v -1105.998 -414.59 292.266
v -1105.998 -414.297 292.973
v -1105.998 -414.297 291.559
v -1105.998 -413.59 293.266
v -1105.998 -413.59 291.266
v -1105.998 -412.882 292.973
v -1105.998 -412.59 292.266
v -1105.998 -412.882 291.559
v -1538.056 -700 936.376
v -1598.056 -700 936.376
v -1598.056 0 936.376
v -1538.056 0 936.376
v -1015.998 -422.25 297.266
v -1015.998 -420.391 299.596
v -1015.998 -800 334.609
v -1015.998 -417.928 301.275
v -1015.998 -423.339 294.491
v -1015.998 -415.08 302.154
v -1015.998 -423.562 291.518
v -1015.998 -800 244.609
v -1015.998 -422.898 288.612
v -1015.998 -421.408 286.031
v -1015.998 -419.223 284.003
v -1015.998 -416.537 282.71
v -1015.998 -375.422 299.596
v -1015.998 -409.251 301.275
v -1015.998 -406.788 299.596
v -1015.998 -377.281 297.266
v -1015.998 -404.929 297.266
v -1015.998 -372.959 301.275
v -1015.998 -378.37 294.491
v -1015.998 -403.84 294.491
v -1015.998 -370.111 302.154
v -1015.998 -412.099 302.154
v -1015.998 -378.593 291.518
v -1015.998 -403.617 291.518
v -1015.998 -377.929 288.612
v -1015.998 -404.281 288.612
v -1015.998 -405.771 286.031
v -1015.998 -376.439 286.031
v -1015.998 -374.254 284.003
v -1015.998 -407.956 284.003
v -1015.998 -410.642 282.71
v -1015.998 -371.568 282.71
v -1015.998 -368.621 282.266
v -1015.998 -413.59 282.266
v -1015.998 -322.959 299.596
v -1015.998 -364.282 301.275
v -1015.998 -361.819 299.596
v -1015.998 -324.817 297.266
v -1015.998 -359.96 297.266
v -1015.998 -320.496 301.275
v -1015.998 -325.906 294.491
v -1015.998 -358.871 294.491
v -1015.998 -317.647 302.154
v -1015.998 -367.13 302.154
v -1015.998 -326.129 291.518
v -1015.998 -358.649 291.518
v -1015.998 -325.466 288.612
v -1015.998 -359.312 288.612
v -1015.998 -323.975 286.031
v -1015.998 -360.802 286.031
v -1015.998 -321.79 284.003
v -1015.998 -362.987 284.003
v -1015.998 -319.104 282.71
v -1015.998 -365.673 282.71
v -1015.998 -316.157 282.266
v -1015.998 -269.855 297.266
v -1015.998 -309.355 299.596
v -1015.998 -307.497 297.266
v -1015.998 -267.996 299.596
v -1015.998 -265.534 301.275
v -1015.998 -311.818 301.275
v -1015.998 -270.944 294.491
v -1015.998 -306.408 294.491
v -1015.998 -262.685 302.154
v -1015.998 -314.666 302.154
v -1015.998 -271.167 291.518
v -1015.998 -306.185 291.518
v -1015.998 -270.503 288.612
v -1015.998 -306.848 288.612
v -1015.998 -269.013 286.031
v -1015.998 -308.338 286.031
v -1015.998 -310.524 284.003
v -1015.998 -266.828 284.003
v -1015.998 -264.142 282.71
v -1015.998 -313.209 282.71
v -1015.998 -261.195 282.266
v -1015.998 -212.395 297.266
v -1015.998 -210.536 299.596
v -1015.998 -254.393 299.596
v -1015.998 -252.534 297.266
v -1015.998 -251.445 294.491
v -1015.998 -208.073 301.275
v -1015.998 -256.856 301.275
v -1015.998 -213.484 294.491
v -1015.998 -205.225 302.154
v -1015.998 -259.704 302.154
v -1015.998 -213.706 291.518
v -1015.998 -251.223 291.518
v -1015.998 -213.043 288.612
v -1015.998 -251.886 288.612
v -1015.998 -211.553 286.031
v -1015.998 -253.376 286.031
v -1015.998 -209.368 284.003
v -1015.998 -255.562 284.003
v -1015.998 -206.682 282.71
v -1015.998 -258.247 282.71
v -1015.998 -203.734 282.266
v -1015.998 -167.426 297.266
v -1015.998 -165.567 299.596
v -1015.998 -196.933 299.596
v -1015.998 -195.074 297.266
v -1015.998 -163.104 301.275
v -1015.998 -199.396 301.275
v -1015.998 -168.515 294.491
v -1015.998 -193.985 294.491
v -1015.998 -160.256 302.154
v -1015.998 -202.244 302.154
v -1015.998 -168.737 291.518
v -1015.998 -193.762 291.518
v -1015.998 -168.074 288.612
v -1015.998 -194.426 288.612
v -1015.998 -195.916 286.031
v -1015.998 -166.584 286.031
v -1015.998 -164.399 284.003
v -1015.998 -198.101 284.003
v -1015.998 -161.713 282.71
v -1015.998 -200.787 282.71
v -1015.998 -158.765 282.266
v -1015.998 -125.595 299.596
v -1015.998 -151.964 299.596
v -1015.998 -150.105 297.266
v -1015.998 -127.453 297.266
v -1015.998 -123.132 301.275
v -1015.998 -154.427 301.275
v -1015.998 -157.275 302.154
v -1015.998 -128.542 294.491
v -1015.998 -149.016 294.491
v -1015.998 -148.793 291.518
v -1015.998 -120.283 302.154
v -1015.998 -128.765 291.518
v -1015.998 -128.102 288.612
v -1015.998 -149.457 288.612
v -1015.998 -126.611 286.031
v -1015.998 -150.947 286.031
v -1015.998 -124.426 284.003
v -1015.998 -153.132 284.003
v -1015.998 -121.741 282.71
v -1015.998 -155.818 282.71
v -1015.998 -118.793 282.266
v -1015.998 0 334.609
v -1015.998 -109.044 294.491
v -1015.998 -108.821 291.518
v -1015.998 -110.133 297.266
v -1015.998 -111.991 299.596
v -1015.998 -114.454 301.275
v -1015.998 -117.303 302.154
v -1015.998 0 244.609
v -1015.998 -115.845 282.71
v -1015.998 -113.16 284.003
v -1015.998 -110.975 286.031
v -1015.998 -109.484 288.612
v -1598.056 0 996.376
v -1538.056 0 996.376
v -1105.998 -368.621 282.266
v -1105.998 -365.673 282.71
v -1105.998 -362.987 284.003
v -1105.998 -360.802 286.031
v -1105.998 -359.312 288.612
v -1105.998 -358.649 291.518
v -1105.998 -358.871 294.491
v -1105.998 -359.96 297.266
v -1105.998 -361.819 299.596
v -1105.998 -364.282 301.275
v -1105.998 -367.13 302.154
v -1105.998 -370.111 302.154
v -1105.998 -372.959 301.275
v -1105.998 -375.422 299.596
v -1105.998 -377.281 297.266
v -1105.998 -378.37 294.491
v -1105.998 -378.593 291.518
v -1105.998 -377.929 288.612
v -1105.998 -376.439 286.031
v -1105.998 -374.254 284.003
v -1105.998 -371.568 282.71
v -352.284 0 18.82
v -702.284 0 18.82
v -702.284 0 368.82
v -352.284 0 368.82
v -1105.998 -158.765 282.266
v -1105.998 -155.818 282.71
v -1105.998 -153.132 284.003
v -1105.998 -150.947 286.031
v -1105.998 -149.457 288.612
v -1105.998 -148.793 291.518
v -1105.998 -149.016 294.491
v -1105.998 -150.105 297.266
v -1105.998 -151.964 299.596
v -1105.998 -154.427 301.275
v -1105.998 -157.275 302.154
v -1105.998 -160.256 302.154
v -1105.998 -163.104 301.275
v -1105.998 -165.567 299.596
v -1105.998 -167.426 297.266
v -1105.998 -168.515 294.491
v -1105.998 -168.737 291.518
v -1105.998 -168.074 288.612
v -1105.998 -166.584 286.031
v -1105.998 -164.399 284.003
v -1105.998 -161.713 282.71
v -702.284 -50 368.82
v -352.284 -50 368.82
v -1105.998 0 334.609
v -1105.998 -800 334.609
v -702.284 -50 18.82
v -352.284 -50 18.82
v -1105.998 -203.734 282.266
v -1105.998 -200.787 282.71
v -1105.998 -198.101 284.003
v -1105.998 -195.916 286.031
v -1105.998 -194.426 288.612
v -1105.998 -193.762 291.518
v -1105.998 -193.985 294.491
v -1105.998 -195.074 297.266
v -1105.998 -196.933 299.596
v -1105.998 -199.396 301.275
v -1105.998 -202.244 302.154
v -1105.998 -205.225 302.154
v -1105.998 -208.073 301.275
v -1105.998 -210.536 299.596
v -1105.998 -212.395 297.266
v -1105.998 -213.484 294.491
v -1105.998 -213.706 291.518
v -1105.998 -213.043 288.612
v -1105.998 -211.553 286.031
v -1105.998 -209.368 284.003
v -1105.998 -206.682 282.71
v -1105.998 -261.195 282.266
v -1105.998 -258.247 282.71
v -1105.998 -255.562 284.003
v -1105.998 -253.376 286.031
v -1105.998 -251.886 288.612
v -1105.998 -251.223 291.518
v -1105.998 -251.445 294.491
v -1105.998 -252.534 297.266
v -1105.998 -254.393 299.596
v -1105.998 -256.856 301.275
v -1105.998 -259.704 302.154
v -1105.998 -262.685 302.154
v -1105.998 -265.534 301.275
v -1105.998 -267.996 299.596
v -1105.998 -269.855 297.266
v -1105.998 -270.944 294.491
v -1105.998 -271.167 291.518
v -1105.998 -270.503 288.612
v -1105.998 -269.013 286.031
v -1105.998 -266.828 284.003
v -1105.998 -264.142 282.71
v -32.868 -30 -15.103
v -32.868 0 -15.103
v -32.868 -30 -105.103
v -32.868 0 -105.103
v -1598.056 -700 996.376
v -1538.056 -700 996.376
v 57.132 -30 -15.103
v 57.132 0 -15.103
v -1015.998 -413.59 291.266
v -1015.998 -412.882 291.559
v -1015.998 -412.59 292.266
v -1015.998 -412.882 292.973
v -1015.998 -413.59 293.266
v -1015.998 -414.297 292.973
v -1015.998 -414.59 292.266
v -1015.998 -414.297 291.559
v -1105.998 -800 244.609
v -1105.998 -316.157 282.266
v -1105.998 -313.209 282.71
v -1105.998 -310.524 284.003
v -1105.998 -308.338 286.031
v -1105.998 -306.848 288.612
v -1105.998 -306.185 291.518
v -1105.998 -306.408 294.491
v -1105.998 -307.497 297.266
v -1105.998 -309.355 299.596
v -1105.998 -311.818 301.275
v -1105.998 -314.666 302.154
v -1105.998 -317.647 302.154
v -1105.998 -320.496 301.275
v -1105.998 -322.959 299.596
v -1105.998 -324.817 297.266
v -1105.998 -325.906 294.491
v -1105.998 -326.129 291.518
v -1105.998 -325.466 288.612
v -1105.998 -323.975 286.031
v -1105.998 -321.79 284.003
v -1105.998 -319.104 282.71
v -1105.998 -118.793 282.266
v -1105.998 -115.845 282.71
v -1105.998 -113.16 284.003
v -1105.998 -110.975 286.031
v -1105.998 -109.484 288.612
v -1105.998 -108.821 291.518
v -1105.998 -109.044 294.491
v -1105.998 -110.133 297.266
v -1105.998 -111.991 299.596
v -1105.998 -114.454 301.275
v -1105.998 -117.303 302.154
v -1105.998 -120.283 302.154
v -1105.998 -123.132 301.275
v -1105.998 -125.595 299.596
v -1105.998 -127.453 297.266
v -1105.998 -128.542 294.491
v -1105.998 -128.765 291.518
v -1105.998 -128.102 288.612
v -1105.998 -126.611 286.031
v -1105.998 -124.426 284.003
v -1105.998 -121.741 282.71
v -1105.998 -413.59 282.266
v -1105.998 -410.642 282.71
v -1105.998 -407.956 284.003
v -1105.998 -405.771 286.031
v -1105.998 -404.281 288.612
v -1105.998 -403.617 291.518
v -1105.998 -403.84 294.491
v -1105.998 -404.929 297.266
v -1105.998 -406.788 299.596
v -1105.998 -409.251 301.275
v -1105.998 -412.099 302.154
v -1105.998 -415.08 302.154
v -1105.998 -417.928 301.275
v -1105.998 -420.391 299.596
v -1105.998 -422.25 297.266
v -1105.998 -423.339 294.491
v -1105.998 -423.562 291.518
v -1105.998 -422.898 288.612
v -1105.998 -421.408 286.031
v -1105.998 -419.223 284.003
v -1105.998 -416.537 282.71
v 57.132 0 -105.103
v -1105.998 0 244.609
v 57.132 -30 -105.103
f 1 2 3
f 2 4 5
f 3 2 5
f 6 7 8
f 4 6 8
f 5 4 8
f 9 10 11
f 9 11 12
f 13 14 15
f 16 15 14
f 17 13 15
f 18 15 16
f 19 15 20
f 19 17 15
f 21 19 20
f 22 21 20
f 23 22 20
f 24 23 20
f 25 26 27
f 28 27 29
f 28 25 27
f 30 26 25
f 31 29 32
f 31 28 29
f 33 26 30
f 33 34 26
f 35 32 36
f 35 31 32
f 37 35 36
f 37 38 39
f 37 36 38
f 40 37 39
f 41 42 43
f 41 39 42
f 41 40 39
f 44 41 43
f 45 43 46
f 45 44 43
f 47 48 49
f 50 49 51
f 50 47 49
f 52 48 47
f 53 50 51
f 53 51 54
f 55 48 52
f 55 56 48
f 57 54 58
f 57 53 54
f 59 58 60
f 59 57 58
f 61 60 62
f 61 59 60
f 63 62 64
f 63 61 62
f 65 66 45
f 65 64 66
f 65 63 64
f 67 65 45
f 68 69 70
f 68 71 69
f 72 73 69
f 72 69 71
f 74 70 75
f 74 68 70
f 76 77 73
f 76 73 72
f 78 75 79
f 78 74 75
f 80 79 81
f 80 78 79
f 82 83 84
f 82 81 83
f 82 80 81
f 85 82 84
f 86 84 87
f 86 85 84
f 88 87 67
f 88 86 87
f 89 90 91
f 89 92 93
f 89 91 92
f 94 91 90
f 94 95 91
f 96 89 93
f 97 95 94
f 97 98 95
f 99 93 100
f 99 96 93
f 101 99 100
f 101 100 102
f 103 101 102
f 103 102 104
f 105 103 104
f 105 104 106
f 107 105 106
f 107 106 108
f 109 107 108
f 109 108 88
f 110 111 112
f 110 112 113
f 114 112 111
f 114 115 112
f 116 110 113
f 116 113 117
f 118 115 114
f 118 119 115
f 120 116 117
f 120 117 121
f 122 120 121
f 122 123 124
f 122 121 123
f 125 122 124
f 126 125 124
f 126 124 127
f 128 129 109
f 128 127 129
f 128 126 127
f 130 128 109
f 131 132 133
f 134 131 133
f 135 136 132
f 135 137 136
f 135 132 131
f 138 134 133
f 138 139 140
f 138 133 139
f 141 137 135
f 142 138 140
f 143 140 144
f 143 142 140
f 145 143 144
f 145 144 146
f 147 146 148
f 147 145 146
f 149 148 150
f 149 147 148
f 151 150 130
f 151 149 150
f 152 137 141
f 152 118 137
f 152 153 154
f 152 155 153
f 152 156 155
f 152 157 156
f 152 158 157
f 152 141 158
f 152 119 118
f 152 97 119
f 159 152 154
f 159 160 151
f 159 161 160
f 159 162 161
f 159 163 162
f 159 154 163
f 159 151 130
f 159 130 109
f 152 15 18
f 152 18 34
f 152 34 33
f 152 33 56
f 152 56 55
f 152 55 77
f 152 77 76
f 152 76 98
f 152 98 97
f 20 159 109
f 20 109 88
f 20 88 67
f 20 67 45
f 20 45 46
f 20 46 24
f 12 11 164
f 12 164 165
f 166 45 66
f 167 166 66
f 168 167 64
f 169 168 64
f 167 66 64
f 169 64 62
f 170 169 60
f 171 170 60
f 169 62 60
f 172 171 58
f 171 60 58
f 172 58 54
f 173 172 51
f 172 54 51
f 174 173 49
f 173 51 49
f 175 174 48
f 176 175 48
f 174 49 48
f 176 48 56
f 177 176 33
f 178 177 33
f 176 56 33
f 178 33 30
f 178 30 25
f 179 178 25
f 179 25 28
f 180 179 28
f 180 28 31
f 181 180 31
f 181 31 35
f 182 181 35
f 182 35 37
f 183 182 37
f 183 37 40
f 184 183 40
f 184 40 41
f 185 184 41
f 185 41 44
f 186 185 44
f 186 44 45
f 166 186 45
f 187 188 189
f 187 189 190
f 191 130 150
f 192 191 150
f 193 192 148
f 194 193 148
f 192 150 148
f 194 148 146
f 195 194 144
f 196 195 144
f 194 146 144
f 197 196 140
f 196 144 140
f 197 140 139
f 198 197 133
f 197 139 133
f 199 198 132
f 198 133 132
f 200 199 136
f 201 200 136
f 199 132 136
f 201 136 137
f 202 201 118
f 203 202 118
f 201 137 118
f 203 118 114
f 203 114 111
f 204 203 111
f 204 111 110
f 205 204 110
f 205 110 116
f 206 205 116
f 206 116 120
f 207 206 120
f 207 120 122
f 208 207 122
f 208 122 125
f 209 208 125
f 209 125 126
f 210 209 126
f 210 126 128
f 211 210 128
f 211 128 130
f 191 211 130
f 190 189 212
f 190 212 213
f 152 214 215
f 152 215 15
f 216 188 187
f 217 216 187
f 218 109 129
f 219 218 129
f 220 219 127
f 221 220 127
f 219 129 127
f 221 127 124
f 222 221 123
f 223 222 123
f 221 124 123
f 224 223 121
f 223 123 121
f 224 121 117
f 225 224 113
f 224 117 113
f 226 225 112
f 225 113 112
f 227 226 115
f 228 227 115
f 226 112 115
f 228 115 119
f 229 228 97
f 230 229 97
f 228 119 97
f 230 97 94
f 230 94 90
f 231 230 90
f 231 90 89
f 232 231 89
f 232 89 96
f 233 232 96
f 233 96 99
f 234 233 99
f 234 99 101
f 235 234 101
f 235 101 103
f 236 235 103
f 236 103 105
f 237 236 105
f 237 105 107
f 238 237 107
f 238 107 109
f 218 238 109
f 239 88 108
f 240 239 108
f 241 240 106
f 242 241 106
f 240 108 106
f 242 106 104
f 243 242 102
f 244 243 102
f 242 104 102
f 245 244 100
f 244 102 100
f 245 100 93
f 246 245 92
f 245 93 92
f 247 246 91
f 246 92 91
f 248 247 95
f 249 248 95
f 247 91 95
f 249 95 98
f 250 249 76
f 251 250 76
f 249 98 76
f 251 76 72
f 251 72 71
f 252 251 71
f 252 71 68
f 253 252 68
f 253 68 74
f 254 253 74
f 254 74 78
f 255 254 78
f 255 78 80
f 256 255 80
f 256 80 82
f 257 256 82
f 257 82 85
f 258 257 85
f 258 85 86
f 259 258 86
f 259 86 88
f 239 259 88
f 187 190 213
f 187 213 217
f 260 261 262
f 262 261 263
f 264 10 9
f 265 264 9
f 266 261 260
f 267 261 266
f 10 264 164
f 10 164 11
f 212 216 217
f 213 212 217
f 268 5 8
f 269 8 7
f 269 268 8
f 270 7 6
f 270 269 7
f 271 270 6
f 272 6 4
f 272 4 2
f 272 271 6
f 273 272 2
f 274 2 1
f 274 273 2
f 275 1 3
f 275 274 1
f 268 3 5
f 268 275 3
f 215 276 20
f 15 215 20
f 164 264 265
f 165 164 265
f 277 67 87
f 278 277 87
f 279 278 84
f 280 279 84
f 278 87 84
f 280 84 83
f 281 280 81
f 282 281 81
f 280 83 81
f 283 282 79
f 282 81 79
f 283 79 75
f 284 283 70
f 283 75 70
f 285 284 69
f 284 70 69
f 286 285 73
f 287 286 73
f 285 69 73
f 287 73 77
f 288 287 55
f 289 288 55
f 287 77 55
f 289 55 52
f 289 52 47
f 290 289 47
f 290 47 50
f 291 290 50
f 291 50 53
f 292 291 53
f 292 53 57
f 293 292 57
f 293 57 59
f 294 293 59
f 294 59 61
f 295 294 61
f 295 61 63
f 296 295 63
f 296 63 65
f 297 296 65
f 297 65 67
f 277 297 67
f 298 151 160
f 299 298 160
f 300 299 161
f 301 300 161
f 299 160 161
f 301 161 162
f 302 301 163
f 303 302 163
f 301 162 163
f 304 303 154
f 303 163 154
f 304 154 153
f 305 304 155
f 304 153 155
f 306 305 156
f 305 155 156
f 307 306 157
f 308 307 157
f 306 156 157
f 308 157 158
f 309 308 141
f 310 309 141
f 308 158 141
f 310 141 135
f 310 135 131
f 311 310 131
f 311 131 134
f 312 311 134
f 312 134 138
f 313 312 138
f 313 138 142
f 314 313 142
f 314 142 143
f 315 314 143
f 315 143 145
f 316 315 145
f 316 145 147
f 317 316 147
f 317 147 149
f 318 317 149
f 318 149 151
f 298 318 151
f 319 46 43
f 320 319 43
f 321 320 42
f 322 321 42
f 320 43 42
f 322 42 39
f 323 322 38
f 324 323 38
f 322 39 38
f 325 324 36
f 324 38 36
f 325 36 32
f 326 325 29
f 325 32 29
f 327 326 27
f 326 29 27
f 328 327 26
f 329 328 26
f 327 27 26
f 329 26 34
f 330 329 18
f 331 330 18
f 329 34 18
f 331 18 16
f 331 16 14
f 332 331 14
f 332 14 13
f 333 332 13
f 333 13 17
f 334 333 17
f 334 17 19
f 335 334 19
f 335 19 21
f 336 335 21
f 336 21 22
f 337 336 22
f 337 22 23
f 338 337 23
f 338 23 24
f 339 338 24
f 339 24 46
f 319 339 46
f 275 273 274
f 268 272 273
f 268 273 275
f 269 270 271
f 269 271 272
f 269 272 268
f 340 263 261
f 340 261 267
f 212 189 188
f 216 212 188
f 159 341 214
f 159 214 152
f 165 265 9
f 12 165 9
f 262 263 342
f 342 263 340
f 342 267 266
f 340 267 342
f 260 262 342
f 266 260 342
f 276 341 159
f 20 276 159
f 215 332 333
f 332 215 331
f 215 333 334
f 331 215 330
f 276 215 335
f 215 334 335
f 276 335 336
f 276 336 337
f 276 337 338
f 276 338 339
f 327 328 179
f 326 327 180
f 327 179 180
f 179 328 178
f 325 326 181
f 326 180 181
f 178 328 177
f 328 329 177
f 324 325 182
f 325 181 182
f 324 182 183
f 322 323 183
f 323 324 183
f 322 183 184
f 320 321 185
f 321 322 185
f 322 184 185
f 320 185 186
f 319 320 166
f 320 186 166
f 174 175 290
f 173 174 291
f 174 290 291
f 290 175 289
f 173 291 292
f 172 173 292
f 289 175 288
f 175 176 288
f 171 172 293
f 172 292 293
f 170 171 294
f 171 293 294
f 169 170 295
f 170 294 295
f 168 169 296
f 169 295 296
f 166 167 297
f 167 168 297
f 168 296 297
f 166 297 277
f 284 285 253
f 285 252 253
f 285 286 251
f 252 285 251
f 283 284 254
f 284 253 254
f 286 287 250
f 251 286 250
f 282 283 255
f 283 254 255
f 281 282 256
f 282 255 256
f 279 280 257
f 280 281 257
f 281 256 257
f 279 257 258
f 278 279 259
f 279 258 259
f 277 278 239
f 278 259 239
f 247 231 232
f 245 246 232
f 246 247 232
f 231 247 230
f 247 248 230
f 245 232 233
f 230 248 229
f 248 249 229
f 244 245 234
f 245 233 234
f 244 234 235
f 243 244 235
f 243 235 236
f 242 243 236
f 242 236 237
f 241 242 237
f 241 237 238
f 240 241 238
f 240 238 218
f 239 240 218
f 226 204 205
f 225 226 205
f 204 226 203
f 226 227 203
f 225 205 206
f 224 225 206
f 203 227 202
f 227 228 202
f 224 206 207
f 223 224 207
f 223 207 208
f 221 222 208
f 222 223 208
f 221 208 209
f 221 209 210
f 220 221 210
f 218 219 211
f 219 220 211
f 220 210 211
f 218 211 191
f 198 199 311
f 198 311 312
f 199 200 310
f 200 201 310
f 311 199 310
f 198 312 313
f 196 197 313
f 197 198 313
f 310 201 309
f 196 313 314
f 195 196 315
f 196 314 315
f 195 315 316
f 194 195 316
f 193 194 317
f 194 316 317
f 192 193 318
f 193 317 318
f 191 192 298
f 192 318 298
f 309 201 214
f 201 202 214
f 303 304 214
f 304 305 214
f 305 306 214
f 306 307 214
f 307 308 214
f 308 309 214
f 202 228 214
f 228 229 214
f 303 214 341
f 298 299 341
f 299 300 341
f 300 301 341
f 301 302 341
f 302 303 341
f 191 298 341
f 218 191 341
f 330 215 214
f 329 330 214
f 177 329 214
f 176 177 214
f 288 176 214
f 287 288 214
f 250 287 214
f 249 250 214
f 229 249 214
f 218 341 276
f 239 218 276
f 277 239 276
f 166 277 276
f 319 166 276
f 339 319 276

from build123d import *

# Parameters (mm, degrees)
SKETCH1_W           = 90
SKETCH1_H           = 90
BOSS_EXTRUDE2_DEPTH = 30
SKETCH2_W           = 350
SKETCH2_H           = 350
BOSS_EXTRUDE3_DEPTH = 50
SKETCH3_W           = 90
SKETCH3_H           = 90
BOSS_EXTRUDE4_DEPTH = 800
SKETCH5_W           = 60
SKETCH5_H           = 60
BOSS_EXTRUDE5_DEPTH = 700
SKETCH4_R           = 10
SKETCH4_R_2         = 1
CUT_EXTRUDE2_DEPTH  = 583.058021663


with BuildPart() as part:
    # Sketch1 → Boss-Extrude2 (new body)
    with BuildSketch(Plane(origin=(0, 0, 0), x_dir=(1, 0, 0), z_dir=(0, 1, 0))):
        with Locations((12.132228886, 60.103304997)):
            Rectangle(SKETCH1_W, SKETCH1_H)
    extrude(amount=-BOSS_EXTRUDE2_DEPTH)


with BuildPart() as body_2:
    # Sketch2 → Boss-Extrude3 (new body)
    with BuildSketch(Plane(origin=(0, 0, 0), x_dir=(1, 0, 0), z_dir=(0, 1, 0))):
        with Locations((-527.284369239, -193.819852957)):
            Rectangle(SKETCH2_W, SKETCH2_H)
    extrude(amount=-BOSS_EXTRUDE3_DEPTH)


with BuildPart() as body_3:
    # Sketch3 → Boss-Extrude4 (new body)
    with BuildSketch(Plane(origin=(0, 0, 0), x_dir=(1, 0, 0), z_dir=(0, 1, 0))):
        with Locations((-1060.997560956, -289.608602032)):
            Rectangle(SKETCH3_W, SKETCH3_H)
    extrude(amount=-BOSS_EXTRUDE4_DEPTH)

    # Sketch4 → Cut-Extrude2 (cut, through all)
    with BuildSketch(Plane(origin=(-1015.997560956, 0, 0), x_dir=(0, 0, -1), z_dir=(1, 0, 0))):
        with Locations((-292.26565685, -118.793047126)):
            Circle(SKETCH4_R)
        with Locations((-292.26565685, -158.765450593)):
            Circle(SKETCH4_R)
        with Locations((-292.26565685, -203.734404493)):
            Circle(SKETCH4_R)
        with Locations((-292.26565685, -261.194734476)):
            Circle(SKETCH4_R)
        with Locations((-292.26565685, -316.156789243)):
            Circle(SKETCH4_R)
        with Locations((-292.26565685, -368.620568793)):
            Circle(SKETCH4_R)
        with Locations((-292.26565685, -413.589522693)):
            Circle(SKETCH4_R)
        with Locations((-292.26565685, -413.589522693)):
            Circle(SKETCH4_R_2, mode=Mode.SUBTRACT)
    extrude(amount=-CUT_EXTRUDE2_DEPTH, mode=Mode.SUBTRACT)


with BuildPart() as body_4:
    # Sketch5 → Boss-Extrude5 (new body)
    with BuildSketch(Plane(origin=(0, 0, 0), x_dir=(1, 0, 0), z_dir=(0, 1, 0))):
        with Locations((-1568.055582619, -966.375876907)):
            Rectangle(SKETCH5_W, SKETCH5_H)
    extrude(amount=-BOSS_EXTRUDE5_DEPTH)


solid = Compound([part.part, body_2.part, body_3.part, body_4.part])
